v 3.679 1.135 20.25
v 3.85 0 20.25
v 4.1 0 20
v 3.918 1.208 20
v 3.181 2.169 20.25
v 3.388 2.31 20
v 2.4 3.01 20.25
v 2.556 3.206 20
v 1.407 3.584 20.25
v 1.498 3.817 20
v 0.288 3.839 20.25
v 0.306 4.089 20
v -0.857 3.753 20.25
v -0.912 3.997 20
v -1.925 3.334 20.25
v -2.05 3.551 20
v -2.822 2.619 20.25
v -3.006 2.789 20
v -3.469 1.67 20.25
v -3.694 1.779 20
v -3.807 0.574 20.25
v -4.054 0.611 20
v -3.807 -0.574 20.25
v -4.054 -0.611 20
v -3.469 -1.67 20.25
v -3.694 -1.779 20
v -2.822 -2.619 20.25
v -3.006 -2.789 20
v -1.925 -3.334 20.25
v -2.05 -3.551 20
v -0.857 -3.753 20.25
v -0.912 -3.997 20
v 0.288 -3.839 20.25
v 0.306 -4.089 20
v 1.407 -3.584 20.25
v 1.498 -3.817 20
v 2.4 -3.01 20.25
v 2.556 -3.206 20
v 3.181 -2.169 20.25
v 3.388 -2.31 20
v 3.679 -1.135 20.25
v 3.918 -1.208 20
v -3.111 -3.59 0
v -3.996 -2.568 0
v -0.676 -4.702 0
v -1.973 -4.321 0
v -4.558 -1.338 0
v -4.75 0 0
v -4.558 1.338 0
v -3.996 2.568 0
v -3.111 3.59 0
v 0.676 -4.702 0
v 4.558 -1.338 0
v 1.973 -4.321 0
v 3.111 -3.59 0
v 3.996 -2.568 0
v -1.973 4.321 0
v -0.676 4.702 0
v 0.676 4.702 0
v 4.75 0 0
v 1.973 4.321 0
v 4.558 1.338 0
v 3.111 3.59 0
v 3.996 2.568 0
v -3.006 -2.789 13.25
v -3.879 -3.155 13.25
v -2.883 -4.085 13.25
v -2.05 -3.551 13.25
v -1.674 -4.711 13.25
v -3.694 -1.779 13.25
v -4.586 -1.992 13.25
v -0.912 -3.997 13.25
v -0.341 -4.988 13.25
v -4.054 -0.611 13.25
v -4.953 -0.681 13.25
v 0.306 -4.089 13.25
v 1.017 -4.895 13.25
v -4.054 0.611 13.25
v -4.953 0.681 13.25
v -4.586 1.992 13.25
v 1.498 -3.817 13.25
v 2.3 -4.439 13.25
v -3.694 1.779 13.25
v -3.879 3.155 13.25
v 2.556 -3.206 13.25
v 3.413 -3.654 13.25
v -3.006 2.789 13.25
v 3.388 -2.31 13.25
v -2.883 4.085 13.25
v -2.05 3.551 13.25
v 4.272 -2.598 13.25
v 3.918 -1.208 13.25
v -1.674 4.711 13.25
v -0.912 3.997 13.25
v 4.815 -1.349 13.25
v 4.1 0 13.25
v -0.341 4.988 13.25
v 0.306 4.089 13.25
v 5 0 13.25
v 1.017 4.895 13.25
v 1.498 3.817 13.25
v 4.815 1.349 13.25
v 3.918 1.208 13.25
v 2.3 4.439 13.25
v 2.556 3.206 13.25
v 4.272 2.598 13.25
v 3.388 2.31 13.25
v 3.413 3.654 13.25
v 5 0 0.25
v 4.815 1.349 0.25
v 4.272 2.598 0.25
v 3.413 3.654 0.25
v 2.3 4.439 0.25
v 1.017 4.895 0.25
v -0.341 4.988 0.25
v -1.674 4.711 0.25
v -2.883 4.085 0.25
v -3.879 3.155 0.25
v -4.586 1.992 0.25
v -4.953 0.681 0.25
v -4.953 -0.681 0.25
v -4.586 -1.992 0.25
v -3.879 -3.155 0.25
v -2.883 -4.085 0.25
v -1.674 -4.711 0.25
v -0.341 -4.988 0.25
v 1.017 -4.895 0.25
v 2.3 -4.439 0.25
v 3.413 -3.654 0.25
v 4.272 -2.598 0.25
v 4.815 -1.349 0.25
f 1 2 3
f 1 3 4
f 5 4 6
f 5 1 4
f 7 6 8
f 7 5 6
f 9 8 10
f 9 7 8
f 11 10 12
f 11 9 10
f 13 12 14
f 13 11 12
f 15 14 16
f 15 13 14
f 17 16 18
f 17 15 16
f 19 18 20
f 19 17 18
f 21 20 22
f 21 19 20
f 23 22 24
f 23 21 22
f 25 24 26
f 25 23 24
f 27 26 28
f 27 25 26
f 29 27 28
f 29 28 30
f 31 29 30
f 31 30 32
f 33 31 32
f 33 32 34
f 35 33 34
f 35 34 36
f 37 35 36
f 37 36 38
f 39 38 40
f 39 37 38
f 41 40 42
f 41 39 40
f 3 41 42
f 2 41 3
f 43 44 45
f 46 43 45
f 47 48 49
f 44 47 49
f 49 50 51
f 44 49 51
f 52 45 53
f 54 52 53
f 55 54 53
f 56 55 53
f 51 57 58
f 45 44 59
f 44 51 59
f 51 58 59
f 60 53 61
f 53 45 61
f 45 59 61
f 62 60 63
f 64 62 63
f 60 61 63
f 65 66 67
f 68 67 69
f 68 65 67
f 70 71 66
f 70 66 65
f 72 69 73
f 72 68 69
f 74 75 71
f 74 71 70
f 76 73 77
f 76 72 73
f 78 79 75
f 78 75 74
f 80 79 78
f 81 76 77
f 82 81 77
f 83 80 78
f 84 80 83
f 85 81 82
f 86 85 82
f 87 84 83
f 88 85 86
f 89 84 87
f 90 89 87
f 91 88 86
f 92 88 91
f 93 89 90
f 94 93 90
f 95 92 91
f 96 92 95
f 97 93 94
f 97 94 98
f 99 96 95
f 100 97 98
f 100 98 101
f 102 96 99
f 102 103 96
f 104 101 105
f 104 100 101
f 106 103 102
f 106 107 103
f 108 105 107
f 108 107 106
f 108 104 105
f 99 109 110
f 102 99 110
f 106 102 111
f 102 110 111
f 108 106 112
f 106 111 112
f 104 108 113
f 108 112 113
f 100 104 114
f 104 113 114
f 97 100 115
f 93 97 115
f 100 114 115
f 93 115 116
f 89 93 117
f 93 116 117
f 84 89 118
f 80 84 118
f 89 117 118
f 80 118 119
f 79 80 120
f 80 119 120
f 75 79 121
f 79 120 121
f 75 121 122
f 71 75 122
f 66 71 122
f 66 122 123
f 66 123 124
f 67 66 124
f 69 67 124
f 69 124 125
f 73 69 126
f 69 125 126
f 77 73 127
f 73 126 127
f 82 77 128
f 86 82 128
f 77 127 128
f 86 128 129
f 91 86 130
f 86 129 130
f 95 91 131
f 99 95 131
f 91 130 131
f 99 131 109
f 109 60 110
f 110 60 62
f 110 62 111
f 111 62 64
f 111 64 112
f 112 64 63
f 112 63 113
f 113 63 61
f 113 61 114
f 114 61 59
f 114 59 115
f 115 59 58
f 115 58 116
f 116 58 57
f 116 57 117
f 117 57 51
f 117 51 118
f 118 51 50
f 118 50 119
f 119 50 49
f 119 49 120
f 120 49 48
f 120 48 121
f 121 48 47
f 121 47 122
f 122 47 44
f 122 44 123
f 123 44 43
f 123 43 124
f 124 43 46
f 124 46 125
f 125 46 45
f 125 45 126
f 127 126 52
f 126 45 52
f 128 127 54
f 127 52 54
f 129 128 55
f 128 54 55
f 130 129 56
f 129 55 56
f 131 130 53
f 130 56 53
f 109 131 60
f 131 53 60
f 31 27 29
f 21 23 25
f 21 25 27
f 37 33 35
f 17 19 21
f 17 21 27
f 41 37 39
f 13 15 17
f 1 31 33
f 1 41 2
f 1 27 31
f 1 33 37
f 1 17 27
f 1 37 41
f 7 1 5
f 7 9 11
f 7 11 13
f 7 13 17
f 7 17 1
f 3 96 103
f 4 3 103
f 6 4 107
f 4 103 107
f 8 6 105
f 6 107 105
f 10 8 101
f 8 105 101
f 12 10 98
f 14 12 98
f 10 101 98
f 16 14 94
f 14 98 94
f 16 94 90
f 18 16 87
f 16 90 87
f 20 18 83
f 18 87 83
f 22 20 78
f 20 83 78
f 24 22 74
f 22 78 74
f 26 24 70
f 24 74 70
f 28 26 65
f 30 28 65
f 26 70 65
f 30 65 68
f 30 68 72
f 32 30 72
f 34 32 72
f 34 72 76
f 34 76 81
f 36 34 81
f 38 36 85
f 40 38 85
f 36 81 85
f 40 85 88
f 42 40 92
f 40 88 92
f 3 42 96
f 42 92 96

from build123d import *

# Parameters (mm, degrees)
SKETCH_R        = 5
PAD_DEPTH       = 13.25
SKETCH001_R     = 4.1
PAD001_DEPTH    = 7
CHAMFER_SIZE    = 0.25
CHAMFER001_SIZE = 0.25


with BuildPart() as part:
    # Sketch → Pad (new body)
    with BuildSketch(Plane.XY):
        Circle(SKETCH_R)
    extrude(amount=PAD_DEPTH)

    # Sketch001 (on Face3 of Pad) → Pad001 (join)
    with BuildSketch(Plane.XY.offset(13.25)):
        Circle(SKETCH001_R)
    extrude(amount=PAD001_DEPTH)

    # Chamfer
    chamfer_edges = [part.edges().sort_by_distance(p)[0] for p in [
        (-4.1, 0, 20.25),
    ]]
    chamfer(chamfer_edges, length=CHAMFER_SIZE)

    # Chamfer001
    chamfer001_edges = [part.edges().sort_by_distance(p)[0] for p in [
        (-5, 0, 0),
    ]]
    chamfer(chamfer001_edges, length=CHAMFER001_SIZE)


solid = part.part
